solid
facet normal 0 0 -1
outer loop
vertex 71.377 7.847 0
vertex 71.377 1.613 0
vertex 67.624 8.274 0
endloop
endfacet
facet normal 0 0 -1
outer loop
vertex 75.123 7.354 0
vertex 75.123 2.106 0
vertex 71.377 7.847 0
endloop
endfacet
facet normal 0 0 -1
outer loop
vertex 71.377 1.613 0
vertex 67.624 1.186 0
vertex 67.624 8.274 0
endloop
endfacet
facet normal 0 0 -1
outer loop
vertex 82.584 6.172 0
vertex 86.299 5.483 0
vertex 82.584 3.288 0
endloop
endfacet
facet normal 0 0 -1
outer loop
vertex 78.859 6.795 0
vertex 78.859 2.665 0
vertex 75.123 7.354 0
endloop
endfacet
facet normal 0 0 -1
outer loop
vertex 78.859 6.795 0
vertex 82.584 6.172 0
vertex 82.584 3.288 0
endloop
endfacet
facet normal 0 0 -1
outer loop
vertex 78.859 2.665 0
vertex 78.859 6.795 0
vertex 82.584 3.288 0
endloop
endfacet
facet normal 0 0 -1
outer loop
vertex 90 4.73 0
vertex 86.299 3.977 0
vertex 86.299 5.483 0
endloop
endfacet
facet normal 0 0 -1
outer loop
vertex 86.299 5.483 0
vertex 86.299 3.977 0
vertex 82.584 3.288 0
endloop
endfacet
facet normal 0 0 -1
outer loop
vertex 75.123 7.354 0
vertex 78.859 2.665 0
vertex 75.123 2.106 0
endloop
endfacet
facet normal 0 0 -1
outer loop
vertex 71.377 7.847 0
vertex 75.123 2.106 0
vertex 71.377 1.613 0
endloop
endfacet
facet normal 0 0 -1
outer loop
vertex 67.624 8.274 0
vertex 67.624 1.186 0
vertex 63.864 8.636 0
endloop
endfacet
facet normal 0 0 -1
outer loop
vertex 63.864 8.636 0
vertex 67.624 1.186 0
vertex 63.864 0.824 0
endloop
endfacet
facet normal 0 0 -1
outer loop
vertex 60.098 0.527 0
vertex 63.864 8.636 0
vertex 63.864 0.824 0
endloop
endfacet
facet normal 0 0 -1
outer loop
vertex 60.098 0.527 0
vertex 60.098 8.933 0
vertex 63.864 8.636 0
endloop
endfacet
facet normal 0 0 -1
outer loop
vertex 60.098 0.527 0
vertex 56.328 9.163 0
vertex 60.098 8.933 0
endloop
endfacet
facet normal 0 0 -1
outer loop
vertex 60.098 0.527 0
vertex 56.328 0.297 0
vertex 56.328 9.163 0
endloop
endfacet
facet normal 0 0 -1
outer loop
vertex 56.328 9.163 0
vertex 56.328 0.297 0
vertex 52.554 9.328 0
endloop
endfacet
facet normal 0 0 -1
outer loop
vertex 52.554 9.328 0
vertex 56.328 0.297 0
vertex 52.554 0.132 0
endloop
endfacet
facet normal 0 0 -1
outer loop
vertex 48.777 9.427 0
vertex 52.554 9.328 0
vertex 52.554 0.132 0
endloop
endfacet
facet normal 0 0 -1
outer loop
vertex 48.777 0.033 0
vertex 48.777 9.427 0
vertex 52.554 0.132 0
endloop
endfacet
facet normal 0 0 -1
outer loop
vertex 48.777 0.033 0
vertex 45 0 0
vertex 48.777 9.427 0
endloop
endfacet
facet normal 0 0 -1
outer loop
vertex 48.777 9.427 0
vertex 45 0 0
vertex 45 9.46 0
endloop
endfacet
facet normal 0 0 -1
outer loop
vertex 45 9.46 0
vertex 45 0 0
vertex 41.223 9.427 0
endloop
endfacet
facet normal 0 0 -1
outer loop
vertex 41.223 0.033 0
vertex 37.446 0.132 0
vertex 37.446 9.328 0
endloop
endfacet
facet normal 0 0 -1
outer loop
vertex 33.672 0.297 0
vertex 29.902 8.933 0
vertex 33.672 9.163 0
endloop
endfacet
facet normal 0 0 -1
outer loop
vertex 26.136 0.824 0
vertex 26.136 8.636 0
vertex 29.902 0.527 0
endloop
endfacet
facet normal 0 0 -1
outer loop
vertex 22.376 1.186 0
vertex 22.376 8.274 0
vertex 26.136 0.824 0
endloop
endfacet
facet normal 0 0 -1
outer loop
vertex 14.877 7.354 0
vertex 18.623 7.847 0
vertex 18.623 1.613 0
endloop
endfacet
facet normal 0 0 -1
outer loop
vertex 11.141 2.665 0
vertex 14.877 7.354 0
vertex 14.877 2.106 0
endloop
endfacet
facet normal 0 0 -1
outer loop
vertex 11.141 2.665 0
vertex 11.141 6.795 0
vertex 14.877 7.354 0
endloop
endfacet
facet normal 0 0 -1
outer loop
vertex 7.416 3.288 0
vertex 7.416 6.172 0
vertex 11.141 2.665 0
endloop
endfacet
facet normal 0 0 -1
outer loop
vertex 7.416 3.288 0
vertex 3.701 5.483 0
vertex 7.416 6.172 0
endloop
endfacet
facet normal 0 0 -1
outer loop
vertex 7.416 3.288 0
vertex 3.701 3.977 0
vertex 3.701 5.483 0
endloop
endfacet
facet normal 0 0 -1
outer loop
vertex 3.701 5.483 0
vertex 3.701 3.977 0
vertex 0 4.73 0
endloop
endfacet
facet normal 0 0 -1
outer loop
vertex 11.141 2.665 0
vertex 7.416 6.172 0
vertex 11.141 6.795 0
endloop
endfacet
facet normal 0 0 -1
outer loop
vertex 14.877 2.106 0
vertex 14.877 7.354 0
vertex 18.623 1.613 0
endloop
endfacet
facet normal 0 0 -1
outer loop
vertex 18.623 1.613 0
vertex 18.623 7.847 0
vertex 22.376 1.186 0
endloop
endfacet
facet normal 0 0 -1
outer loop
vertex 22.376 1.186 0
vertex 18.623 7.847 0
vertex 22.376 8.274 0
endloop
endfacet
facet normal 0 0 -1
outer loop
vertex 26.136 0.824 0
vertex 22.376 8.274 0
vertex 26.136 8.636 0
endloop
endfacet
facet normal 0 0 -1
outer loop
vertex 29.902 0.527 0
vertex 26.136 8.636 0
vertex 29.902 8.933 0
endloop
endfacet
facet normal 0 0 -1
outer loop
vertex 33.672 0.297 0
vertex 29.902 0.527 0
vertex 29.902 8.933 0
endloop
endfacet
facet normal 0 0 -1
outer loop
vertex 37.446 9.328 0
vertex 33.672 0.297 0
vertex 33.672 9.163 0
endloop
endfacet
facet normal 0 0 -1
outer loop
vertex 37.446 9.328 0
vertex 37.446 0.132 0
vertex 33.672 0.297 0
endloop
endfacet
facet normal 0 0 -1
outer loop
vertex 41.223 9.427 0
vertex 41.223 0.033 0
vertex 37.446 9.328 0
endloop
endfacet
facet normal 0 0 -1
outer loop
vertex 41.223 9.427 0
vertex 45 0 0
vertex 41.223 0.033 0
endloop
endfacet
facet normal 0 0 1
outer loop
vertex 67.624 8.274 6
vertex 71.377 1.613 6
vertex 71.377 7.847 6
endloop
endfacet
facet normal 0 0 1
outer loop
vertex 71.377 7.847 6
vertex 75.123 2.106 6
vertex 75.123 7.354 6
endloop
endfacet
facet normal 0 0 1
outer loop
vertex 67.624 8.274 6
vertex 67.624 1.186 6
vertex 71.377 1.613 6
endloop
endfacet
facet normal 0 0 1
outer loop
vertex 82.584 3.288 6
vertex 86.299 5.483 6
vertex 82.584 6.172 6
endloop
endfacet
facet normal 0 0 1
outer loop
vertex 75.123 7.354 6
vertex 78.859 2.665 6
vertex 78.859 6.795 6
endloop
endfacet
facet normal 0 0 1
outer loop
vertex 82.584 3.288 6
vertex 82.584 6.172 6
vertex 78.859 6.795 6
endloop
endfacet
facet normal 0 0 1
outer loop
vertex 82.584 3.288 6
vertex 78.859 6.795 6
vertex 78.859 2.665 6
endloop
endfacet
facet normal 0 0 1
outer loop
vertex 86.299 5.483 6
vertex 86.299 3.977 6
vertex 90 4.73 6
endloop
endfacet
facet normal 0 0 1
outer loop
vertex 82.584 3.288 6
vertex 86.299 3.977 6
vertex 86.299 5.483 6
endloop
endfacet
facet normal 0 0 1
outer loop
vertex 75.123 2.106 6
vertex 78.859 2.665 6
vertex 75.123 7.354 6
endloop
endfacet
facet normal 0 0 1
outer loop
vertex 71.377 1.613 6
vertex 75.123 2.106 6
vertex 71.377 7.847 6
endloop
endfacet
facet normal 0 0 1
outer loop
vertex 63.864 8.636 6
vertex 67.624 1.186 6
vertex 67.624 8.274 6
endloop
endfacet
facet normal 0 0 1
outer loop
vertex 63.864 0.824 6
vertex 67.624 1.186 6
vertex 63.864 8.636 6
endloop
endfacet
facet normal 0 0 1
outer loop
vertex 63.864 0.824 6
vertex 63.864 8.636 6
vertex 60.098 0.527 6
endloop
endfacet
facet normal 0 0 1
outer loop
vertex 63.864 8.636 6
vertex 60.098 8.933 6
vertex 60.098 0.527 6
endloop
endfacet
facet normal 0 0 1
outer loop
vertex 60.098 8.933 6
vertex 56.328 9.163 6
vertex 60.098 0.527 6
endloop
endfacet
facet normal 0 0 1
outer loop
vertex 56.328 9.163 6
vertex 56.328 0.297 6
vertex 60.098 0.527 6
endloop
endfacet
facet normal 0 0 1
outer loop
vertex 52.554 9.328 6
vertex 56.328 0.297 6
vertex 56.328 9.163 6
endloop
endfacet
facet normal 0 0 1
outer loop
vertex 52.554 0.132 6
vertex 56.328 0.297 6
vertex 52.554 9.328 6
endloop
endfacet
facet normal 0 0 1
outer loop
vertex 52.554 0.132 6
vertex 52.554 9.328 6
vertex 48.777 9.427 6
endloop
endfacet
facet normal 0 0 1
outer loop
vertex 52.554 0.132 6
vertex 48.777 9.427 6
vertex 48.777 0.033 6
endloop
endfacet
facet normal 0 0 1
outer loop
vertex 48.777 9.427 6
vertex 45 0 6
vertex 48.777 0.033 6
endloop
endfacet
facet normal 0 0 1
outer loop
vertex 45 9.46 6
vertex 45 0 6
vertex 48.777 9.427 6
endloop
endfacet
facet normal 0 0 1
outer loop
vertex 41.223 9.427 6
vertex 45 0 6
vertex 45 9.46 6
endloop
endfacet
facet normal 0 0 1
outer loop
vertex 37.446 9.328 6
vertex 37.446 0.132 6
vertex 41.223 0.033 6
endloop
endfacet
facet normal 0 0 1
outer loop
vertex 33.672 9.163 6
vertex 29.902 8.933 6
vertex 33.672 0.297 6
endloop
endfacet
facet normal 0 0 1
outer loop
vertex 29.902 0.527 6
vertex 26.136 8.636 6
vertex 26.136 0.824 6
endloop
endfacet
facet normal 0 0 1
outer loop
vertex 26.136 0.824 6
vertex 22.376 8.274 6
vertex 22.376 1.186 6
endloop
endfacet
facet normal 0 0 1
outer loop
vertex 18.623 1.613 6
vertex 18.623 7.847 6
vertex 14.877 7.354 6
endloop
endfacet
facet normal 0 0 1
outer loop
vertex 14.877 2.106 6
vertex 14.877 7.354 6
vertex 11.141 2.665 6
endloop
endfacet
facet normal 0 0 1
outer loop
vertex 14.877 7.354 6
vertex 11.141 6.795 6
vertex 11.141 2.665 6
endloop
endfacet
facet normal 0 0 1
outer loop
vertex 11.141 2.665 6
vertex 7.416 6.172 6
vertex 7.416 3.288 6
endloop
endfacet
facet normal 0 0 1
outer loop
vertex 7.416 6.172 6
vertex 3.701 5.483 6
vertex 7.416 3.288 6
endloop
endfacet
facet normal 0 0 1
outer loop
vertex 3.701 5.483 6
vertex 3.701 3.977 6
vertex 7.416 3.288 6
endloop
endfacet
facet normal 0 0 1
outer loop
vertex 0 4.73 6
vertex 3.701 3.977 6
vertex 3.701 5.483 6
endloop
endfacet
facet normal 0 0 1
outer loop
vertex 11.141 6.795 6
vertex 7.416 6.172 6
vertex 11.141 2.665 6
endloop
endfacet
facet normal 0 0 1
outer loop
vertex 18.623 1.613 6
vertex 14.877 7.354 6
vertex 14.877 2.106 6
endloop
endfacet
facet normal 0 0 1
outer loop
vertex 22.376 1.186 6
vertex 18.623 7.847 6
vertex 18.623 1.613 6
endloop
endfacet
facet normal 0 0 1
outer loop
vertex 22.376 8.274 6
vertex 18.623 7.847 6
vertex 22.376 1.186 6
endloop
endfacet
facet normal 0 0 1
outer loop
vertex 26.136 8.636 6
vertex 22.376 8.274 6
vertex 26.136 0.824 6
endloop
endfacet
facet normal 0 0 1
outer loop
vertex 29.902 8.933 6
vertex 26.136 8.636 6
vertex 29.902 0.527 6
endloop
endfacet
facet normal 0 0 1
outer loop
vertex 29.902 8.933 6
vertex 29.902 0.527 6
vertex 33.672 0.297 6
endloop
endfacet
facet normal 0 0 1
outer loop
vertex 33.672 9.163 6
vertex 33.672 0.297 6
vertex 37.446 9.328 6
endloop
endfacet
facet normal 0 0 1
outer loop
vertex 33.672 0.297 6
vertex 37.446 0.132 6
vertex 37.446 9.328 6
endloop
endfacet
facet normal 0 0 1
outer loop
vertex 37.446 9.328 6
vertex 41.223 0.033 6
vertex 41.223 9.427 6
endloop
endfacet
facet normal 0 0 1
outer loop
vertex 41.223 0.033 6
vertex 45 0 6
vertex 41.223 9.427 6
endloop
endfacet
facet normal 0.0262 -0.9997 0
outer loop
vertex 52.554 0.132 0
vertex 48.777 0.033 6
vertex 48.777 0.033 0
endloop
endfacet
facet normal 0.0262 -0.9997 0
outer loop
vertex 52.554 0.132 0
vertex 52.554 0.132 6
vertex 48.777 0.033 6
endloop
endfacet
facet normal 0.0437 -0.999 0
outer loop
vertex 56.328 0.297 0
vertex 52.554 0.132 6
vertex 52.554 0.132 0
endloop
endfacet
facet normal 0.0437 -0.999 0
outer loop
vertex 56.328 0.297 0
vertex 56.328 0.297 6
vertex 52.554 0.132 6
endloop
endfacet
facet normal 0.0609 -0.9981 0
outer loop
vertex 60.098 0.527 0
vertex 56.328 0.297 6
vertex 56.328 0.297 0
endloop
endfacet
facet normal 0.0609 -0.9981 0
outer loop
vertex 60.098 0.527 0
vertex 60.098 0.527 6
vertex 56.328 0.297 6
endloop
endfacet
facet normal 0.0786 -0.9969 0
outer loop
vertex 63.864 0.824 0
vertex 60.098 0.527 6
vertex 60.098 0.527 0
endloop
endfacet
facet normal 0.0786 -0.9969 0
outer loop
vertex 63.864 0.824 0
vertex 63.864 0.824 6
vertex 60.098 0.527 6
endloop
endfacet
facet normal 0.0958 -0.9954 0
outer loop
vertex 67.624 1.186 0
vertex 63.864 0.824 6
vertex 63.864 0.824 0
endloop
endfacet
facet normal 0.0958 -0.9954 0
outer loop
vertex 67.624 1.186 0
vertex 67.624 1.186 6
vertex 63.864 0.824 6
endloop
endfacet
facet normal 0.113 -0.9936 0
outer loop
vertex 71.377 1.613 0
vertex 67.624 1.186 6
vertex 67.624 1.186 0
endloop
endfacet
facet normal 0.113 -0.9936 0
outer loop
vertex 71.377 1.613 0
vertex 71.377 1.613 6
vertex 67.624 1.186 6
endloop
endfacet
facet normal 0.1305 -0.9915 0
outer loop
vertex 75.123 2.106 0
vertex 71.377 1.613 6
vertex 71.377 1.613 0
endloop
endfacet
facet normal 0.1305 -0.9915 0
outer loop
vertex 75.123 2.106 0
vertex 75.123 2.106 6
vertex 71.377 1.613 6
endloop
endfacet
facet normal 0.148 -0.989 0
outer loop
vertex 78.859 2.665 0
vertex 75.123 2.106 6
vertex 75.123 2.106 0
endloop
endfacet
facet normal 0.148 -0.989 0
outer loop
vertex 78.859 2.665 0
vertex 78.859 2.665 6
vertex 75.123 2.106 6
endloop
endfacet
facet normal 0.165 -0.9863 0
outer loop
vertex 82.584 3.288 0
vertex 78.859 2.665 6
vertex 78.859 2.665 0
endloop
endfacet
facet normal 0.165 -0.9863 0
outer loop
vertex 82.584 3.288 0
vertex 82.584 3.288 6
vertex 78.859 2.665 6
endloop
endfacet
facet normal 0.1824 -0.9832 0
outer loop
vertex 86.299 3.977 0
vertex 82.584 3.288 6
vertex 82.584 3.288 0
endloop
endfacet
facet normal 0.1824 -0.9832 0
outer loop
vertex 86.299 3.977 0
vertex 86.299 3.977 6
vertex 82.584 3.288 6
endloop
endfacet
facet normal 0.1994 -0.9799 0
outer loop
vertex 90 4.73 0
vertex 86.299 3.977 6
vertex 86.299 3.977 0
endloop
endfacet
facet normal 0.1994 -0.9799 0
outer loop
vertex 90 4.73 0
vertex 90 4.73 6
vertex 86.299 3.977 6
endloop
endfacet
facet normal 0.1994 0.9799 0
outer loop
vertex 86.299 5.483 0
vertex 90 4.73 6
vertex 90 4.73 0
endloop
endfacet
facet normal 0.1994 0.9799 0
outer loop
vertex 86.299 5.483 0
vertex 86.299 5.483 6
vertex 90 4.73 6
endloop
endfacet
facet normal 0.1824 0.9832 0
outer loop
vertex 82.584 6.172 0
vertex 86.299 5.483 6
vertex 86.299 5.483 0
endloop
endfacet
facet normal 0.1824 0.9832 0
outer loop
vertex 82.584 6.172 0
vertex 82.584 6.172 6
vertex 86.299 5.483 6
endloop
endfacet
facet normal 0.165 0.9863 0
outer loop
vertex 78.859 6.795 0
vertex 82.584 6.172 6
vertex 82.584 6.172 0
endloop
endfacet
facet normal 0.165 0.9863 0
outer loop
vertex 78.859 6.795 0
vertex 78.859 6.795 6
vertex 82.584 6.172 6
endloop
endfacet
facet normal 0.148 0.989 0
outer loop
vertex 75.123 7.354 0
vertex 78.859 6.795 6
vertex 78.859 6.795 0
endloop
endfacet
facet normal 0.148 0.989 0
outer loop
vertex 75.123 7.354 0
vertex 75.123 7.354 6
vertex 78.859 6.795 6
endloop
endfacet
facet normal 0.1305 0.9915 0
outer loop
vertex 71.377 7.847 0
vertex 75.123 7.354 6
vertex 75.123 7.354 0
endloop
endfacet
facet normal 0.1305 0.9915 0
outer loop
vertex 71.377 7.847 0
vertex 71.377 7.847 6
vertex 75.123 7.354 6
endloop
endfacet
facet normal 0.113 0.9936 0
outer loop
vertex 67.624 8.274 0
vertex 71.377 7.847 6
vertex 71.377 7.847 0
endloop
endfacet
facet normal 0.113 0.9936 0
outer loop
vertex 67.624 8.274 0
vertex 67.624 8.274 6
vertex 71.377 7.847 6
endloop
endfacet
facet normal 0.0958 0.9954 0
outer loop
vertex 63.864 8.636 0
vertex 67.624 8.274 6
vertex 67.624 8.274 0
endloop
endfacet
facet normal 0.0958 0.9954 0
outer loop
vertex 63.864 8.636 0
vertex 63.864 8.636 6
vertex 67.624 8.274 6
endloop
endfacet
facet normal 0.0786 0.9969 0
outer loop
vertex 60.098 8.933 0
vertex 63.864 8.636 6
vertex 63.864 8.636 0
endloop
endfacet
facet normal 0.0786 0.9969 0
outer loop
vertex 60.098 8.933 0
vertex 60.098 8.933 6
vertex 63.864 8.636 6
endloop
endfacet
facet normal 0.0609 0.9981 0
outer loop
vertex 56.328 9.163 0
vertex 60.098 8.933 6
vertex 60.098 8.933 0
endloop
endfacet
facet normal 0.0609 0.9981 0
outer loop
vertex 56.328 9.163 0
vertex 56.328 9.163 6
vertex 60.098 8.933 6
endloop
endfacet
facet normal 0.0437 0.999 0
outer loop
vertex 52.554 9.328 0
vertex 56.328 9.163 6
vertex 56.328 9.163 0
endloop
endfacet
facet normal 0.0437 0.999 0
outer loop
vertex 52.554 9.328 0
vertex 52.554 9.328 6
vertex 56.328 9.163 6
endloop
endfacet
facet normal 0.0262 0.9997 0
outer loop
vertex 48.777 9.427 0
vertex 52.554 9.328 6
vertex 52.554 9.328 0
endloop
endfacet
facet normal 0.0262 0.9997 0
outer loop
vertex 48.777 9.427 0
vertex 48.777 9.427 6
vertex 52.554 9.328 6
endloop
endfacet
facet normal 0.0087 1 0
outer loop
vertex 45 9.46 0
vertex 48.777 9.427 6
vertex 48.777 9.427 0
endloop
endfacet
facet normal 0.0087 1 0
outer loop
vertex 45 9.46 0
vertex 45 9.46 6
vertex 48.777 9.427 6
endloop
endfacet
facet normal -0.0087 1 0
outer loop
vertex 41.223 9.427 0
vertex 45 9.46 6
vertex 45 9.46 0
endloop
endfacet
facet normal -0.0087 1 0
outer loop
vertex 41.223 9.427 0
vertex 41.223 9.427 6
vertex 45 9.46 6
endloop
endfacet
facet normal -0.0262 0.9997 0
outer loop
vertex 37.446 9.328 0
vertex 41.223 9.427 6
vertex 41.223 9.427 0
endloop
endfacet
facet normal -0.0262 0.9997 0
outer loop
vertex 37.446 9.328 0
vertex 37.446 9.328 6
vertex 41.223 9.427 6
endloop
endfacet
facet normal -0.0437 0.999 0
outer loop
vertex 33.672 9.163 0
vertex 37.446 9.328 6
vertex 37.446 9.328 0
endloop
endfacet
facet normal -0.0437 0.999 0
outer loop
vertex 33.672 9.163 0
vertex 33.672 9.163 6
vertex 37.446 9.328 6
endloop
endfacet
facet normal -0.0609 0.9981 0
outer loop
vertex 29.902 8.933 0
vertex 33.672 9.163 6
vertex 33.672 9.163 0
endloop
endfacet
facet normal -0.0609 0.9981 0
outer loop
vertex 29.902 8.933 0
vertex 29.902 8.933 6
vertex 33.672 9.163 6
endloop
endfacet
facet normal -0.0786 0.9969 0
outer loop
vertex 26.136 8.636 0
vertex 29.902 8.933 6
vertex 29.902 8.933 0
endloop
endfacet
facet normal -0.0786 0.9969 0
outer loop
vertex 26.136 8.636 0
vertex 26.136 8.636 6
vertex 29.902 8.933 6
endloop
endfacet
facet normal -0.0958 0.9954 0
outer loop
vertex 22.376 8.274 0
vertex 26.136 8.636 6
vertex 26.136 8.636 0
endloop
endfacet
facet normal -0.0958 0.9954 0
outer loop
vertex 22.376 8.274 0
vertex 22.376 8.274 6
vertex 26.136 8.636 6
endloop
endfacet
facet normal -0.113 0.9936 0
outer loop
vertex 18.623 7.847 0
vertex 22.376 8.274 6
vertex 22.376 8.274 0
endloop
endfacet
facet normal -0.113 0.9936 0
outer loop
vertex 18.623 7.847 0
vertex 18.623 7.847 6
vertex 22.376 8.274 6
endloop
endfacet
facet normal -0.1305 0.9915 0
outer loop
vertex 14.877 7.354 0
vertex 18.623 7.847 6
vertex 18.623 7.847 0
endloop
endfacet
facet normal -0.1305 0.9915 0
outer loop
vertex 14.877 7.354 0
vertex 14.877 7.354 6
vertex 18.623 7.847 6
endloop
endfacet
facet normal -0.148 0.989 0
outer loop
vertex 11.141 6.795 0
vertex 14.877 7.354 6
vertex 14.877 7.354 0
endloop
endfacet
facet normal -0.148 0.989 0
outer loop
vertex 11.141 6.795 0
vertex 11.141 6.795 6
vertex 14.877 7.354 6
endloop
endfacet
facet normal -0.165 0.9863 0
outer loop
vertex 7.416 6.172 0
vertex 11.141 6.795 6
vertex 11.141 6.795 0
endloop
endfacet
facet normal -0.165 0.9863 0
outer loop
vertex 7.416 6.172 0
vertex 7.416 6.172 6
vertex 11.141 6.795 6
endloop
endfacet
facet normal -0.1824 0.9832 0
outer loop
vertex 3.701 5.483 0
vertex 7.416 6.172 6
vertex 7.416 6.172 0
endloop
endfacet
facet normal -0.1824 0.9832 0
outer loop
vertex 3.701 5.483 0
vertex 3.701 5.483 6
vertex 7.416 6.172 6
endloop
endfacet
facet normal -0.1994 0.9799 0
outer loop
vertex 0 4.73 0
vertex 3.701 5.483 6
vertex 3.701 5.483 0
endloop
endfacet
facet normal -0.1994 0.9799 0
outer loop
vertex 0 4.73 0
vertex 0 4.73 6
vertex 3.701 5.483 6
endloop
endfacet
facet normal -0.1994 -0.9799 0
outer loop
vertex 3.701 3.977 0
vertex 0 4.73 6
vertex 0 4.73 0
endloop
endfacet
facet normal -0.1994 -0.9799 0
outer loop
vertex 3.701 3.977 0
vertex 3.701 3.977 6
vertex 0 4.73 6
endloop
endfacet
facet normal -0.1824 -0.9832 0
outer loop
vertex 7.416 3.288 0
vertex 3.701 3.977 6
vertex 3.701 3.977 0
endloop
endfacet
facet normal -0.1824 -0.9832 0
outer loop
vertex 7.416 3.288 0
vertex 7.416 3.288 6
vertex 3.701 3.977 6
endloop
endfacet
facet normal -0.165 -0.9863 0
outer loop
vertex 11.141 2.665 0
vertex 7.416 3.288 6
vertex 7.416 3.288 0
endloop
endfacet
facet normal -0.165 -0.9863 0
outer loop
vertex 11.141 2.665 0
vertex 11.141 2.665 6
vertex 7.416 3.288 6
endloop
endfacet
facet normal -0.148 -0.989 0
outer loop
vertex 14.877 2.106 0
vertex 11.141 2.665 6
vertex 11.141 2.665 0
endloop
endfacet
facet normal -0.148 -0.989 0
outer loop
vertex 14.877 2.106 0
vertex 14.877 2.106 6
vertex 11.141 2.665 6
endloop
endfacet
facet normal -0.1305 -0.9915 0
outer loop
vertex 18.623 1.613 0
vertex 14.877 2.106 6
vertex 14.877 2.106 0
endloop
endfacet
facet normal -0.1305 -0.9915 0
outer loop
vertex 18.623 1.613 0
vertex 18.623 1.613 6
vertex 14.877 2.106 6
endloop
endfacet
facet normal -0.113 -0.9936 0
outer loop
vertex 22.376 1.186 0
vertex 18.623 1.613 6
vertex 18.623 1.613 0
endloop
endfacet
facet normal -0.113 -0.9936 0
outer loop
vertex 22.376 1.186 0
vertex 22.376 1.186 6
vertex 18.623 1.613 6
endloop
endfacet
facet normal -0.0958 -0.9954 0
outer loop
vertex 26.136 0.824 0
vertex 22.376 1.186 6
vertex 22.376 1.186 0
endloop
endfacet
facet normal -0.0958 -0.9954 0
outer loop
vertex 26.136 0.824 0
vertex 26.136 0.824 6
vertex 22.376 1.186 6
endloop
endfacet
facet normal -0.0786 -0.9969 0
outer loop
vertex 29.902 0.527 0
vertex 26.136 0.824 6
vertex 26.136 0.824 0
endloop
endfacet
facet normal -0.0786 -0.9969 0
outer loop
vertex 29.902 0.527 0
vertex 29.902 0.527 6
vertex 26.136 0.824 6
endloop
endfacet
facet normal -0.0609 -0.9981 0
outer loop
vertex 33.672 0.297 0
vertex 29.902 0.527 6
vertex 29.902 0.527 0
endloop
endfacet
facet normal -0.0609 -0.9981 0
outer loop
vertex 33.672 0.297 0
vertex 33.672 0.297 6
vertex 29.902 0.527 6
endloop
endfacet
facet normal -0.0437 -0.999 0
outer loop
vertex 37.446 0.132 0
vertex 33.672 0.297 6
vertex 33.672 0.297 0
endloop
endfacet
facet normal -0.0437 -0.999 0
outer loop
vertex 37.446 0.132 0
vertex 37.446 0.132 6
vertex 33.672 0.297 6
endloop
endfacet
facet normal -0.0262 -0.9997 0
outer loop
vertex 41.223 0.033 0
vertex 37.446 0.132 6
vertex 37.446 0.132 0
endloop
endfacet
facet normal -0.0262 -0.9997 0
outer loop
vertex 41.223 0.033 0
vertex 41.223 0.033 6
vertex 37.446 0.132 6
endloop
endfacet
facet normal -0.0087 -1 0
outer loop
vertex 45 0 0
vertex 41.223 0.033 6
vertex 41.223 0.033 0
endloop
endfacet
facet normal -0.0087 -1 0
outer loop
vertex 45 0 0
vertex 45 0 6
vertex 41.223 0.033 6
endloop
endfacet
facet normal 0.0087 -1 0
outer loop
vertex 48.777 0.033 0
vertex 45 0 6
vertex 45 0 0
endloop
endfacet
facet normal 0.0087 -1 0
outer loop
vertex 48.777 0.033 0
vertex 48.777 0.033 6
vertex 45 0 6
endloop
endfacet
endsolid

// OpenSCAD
$fn = 32;

// ----------------------------------------------------------------------
// Arc profile plate: lens, 48 points
// ----------------------------------------------------------------------

// --- parameters (mm) ---
lens_chord = 90;          // chord length of the lens, X
arc_r = 216.44;           // radius of both arcs
arc_angle = 24;           // angle of each arc, degrees
sagitta = 4.73;           // bulge of each arc (half the lens height)
arc_step = 1;             // sampling step of the arcs, degrees
plate_t = 6;              // plate thickness, Z

bbox_y = 2 * sagitta;  // full lens height

profile = [[90, 4.73], [86.299, 5.483], [82.584, 6.172], [78.859, 6.795], [75.123, 7.354], [71.377, 7.847], [67.624, 8.274], [63.864, 8.636], [60.098, 8.933], [56.328, 9.163], [52.554, 9.328], [48.777, 9.427], [45, 9.46], [41.223, 9.427], [37.446, 9.328], [33.672, 9.163], [29.902, 8.933], [26.136, 8.636], [22.376, 8.274], [18.623, 7.847], [14.877, 7.354], [11.141, 6.795], [7.416, 6.172], [3.701, 5.483], [0, 4.73], [3.701, 3.977], [7.416, 3.288], [11.141, 2.665], [14.877, 2.106], [18.623, 1.613], [22.376, 1.186], [26.136, 0.824], [29.902, 0.527], [33.672, 0.297], [37.446, 0.132], [41.223, 0.033], [45, 0], [48.777, 0.033], [52.554, 0.132], [56.328, 0.297], [60.098, 0.527], [63.864, 0.824], [67.624, 1.186], [71.377, 1.613], [75.123, 2.106], [78.859, 2.665], [82.584, 3.288], [86.299, 3.977]];  // primary outline, 48 points, counter clockwise

// --- the one profile operation ---
linear_extrude(height = plate_t) polygon(points = profile);
